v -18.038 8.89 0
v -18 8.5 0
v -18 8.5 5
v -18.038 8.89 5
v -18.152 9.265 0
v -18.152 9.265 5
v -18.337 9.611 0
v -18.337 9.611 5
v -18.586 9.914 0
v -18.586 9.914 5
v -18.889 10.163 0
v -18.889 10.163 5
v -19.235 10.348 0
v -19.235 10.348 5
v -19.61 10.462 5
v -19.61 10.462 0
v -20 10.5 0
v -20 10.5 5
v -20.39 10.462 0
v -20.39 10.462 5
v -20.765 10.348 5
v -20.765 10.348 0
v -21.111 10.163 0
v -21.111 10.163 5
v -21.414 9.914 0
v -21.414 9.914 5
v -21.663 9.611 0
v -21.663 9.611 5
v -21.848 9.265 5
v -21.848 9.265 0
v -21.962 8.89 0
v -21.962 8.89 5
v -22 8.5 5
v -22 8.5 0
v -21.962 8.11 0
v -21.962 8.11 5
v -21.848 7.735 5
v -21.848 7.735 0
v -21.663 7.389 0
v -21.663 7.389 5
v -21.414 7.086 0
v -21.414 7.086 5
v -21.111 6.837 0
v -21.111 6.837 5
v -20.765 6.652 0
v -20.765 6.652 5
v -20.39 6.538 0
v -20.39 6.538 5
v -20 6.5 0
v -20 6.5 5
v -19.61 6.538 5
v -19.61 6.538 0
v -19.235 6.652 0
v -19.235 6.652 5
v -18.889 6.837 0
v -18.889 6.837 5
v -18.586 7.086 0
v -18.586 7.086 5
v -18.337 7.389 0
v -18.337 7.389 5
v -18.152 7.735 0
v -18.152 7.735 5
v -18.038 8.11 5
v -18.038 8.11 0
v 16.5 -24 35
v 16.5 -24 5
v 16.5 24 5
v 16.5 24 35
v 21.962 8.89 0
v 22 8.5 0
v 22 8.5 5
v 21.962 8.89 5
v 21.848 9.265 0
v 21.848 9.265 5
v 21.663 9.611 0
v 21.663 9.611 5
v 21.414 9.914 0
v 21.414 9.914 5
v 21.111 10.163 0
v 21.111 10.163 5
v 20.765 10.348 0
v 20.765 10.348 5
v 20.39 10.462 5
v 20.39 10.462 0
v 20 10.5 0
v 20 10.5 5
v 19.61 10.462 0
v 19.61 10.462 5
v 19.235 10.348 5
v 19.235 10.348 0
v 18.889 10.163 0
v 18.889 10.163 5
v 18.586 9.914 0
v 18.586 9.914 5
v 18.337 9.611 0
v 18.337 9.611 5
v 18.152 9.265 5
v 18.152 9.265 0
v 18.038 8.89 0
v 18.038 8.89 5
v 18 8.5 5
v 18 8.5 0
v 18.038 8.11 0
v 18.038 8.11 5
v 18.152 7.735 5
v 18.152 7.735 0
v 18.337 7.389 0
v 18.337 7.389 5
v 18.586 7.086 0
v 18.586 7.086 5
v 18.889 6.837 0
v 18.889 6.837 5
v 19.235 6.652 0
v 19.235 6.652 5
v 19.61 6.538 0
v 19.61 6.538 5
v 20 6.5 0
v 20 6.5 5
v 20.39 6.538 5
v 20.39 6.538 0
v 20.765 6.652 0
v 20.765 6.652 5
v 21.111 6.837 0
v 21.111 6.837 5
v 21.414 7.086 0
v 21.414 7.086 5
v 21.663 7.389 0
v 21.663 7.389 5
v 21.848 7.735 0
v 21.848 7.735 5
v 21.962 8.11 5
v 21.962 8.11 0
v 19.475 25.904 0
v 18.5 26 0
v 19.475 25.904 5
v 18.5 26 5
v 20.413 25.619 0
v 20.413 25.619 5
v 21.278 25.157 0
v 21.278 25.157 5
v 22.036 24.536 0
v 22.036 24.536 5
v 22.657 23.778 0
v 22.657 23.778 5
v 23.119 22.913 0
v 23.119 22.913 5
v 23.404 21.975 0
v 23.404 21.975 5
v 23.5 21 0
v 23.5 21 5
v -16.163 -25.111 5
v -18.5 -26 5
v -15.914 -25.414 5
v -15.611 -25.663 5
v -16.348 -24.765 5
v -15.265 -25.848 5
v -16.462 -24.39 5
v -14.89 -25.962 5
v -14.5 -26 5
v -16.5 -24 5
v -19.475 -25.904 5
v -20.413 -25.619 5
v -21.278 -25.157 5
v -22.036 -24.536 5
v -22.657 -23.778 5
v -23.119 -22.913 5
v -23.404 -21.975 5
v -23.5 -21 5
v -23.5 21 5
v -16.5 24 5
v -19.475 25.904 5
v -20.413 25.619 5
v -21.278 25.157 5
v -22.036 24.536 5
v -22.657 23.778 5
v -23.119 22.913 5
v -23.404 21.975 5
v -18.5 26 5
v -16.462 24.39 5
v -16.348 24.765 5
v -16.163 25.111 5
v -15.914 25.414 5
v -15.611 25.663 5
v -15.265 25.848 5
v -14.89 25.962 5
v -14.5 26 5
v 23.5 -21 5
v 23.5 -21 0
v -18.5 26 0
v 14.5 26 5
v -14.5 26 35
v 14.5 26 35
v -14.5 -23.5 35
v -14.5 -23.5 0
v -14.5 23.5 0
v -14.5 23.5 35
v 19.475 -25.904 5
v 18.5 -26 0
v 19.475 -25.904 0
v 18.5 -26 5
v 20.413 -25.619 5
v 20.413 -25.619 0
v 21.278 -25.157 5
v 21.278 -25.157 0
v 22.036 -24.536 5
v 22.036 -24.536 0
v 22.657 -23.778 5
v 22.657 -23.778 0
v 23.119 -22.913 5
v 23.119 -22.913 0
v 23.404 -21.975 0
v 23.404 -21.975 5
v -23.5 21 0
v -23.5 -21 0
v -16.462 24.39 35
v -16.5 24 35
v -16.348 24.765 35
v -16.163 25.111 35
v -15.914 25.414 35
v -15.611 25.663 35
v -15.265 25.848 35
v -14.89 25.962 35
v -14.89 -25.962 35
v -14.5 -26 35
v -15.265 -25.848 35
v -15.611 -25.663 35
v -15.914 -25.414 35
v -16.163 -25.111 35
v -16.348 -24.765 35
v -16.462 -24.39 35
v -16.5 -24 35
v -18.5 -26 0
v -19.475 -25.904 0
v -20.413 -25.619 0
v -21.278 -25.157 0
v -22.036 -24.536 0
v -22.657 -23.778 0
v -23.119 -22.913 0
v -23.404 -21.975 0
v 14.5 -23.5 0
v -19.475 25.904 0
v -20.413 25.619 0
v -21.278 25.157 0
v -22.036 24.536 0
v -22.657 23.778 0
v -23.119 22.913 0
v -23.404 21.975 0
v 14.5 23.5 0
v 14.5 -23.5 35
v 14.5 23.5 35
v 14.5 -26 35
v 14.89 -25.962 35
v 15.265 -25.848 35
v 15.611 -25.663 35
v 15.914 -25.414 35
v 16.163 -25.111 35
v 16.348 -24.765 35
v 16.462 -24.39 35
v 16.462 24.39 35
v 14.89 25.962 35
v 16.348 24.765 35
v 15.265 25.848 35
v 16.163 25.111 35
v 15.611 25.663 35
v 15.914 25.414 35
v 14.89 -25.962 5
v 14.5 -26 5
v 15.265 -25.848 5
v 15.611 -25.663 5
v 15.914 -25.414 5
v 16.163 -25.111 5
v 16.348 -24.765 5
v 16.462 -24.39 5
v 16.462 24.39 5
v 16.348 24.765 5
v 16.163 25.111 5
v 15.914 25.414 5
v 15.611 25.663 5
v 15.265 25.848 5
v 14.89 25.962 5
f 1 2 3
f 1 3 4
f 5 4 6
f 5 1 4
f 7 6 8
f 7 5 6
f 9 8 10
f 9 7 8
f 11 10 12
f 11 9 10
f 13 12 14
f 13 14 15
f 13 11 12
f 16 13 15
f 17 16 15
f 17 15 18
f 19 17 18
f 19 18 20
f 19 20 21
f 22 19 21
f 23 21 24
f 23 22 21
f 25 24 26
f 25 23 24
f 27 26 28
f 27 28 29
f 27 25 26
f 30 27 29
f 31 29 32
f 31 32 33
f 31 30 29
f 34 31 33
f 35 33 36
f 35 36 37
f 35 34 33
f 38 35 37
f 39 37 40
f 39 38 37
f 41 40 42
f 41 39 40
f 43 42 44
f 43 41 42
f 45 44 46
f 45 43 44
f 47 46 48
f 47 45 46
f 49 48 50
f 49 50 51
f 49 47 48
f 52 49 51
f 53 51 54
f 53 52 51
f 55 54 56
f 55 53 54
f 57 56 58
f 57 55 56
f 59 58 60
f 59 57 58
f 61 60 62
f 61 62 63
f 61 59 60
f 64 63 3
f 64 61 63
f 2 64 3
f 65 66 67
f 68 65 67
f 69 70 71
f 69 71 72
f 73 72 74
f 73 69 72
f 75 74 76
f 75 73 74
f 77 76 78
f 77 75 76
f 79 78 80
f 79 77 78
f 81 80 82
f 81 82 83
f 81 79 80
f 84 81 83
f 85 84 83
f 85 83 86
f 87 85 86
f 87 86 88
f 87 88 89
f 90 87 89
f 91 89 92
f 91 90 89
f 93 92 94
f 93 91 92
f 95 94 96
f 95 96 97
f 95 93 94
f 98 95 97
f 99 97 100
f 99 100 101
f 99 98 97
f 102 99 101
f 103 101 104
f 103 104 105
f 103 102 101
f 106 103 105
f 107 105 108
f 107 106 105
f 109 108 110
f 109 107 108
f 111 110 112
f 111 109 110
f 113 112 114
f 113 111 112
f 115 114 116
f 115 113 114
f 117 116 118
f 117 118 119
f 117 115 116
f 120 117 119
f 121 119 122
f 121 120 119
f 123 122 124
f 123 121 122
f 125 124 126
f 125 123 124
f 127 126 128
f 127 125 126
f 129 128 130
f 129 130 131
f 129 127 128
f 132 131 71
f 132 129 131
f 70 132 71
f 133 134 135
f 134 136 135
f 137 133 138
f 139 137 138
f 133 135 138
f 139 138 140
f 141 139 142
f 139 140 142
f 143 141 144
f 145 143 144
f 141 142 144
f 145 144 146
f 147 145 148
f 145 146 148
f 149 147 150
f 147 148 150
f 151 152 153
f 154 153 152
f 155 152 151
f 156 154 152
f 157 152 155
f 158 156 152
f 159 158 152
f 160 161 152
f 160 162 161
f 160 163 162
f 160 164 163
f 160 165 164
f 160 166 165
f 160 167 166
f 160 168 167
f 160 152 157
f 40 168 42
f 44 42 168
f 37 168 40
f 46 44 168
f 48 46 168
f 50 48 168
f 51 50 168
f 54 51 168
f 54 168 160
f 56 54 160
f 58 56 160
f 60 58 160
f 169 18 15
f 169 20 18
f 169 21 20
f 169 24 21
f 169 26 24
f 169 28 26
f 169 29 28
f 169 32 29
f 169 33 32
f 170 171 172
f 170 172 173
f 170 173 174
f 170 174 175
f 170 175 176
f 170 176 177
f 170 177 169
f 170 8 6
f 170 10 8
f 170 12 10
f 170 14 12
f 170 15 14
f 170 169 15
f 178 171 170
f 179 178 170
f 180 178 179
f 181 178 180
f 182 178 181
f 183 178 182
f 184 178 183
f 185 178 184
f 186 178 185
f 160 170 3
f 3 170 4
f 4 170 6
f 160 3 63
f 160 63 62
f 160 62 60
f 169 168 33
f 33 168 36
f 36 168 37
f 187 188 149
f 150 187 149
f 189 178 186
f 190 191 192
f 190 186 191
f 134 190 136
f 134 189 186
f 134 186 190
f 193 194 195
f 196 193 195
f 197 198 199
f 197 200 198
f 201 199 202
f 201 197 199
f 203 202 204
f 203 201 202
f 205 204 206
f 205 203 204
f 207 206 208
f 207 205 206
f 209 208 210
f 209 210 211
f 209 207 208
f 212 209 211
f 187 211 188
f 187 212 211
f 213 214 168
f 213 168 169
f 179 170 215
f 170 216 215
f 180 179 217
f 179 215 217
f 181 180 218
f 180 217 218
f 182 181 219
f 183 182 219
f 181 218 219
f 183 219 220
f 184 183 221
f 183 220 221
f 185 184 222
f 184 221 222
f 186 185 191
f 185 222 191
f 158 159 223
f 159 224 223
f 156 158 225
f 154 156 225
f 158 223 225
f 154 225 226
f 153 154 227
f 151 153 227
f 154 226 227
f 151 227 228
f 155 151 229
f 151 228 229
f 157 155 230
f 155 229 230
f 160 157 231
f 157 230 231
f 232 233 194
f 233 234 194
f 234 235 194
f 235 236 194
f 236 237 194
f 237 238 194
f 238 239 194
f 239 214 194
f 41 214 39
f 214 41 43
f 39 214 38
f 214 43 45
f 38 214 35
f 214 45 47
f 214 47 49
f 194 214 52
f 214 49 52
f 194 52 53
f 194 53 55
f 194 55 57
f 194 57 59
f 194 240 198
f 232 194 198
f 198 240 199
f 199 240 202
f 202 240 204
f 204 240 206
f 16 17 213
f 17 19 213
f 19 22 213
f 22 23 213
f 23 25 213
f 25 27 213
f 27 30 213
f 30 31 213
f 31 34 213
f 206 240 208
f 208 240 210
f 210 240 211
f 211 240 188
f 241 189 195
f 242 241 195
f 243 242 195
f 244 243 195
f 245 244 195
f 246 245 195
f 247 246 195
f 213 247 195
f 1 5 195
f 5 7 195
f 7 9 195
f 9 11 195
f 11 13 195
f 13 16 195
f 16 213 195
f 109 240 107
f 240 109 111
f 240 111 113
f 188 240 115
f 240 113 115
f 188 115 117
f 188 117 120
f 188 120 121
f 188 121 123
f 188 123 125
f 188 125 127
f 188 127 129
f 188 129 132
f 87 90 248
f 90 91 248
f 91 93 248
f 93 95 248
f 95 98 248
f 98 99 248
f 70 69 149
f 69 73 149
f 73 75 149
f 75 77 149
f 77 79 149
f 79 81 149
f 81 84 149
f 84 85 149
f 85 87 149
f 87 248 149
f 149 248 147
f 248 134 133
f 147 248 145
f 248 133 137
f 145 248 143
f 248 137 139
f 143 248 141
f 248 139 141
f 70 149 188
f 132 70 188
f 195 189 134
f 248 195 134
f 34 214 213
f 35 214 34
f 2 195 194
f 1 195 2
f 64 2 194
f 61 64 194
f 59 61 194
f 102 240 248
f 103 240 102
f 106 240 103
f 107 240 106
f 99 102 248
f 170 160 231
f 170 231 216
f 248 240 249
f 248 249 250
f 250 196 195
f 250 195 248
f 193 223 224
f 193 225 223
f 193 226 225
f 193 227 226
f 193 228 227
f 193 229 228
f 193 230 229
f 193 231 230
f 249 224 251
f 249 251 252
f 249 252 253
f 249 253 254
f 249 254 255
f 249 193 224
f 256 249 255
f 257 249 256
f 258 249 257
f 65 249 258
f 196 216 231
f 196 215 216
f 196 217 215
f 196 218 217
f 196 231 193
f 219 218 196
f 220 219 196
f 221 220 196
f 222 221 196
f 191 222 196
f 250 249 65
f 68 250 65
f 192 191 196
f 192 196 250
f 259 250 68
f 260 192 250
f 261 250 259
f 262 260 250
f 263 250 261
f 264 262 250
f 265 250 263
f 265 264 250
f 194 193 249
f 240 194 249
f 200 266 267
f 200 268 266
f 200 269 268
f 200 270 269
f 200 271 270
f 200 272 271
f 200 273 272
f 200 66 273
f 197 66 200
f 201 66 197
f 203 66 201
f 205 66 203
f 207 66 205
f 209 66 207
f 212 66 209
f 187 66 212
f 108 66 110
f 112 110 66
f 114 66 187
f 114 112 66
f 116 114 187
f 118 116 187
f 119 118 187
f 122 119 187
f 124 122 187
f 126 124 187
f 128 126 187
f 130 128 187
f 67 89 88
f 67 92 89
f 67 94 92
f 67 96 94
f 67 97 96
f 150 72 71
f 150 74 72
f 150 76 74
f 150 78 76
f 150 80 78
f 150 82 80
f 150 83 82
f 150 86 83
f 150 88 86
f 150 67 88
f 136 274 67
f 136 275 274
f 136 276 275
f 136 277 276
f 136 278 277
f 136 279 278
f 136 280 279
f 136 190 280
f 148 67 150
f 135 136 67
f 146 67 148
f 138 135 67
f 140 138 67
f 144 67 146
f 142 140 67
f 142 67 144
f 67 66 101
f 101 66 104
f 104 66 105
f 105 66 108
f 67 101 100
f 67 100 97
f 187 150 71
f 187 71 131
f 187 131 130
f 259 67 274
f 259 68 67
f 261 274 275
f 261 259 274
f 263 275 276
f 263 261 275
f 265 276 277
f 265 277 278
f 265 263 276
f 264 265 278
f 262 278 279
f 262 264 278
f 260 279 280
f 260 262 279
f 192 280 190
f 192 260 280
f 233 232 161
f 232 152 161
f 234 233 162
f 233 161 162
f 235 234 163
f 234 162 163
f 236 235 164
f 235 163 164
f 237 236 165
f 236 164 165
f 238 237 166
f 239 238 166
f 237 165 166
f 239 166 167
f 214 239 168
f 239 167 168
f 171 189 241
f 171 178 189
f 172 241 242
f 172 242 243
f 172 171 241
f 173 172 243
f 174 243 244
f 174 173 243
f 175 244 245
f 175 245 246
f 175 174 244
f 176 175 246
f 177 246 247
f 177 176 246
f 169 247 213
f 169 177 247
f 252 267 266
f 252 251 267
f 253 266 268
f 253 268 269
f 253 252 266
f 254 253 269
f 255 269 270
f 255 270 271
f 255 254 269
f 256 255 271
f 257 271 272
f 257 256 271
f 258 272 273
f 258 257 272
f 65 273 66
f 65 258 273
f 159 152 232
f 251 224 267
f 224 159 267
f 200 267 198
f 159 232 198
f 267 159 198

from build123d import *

# Parameters (mm, degrees)
F0_W     = 7
F0_H     = 52
F0_R     = 2
F1_DEPTH = 5
F0_W_2   = 33
F0_W_3   = 29
F0_H_2   = 47
F2_DEPTH = 35
F3_DEPTH = 5
F4_R     = 5
F5_R     = 2


with BuildPart() as f1:
    # F0 (on Top) → F1 (new body)
    with BuildSketch(Plane.XY):
        with Locations((-20, 0)):
            Rectangle(F0_W, F0_H)
        with Locations((-20, 8.5)):
            Circle(F0_R, mode=Mode.SUBTRACT)
    extrude(amount=F1_DEPTH)

    # F0 (on Top) → F2 (join)
    with BuildSketch(Plane.XY):
        Rectangle(F0_W_2, F0_H)
        Rectangle(F0_W_3, F0_H_2, mode=Mode.SUBTRACT)
    extrude(amount=F2_DEPTH)

    # F0 (on Top) → F3 (join)
    with BuildSketch(Plane.XY):
        with Locations((20, 0)):
            Rectangle(F0_W, F0_H)
        with Locations((20, 8.5)):
            Circle(F0_R, mode=Mode.SUBTRACT)
    extrude(amount=F3_DEPTH)

    # F4
    f4_edges = [f1.edges().sort_by_distance(p)[0] for p in [
        (-23.5, -26, 2.5),
        (23.5, -26, 2.5),
        (23.5, 26, 2.5),
        (-23.5, 26, 2.5),
    ]]
    fillet(f4_edges, radius=F4_R)

    # F5
    f5_edges = [f1.edges().sort_by_distance(p)[0] for p in [
        (-16.5, -26, 20),
        (16.5, -26, 20),
        (16.5, 26, 20),
        (-16.5, 26, 20),
    ]]
    fillet(f5_edges, radius=F5_R)


solid = f1.part
